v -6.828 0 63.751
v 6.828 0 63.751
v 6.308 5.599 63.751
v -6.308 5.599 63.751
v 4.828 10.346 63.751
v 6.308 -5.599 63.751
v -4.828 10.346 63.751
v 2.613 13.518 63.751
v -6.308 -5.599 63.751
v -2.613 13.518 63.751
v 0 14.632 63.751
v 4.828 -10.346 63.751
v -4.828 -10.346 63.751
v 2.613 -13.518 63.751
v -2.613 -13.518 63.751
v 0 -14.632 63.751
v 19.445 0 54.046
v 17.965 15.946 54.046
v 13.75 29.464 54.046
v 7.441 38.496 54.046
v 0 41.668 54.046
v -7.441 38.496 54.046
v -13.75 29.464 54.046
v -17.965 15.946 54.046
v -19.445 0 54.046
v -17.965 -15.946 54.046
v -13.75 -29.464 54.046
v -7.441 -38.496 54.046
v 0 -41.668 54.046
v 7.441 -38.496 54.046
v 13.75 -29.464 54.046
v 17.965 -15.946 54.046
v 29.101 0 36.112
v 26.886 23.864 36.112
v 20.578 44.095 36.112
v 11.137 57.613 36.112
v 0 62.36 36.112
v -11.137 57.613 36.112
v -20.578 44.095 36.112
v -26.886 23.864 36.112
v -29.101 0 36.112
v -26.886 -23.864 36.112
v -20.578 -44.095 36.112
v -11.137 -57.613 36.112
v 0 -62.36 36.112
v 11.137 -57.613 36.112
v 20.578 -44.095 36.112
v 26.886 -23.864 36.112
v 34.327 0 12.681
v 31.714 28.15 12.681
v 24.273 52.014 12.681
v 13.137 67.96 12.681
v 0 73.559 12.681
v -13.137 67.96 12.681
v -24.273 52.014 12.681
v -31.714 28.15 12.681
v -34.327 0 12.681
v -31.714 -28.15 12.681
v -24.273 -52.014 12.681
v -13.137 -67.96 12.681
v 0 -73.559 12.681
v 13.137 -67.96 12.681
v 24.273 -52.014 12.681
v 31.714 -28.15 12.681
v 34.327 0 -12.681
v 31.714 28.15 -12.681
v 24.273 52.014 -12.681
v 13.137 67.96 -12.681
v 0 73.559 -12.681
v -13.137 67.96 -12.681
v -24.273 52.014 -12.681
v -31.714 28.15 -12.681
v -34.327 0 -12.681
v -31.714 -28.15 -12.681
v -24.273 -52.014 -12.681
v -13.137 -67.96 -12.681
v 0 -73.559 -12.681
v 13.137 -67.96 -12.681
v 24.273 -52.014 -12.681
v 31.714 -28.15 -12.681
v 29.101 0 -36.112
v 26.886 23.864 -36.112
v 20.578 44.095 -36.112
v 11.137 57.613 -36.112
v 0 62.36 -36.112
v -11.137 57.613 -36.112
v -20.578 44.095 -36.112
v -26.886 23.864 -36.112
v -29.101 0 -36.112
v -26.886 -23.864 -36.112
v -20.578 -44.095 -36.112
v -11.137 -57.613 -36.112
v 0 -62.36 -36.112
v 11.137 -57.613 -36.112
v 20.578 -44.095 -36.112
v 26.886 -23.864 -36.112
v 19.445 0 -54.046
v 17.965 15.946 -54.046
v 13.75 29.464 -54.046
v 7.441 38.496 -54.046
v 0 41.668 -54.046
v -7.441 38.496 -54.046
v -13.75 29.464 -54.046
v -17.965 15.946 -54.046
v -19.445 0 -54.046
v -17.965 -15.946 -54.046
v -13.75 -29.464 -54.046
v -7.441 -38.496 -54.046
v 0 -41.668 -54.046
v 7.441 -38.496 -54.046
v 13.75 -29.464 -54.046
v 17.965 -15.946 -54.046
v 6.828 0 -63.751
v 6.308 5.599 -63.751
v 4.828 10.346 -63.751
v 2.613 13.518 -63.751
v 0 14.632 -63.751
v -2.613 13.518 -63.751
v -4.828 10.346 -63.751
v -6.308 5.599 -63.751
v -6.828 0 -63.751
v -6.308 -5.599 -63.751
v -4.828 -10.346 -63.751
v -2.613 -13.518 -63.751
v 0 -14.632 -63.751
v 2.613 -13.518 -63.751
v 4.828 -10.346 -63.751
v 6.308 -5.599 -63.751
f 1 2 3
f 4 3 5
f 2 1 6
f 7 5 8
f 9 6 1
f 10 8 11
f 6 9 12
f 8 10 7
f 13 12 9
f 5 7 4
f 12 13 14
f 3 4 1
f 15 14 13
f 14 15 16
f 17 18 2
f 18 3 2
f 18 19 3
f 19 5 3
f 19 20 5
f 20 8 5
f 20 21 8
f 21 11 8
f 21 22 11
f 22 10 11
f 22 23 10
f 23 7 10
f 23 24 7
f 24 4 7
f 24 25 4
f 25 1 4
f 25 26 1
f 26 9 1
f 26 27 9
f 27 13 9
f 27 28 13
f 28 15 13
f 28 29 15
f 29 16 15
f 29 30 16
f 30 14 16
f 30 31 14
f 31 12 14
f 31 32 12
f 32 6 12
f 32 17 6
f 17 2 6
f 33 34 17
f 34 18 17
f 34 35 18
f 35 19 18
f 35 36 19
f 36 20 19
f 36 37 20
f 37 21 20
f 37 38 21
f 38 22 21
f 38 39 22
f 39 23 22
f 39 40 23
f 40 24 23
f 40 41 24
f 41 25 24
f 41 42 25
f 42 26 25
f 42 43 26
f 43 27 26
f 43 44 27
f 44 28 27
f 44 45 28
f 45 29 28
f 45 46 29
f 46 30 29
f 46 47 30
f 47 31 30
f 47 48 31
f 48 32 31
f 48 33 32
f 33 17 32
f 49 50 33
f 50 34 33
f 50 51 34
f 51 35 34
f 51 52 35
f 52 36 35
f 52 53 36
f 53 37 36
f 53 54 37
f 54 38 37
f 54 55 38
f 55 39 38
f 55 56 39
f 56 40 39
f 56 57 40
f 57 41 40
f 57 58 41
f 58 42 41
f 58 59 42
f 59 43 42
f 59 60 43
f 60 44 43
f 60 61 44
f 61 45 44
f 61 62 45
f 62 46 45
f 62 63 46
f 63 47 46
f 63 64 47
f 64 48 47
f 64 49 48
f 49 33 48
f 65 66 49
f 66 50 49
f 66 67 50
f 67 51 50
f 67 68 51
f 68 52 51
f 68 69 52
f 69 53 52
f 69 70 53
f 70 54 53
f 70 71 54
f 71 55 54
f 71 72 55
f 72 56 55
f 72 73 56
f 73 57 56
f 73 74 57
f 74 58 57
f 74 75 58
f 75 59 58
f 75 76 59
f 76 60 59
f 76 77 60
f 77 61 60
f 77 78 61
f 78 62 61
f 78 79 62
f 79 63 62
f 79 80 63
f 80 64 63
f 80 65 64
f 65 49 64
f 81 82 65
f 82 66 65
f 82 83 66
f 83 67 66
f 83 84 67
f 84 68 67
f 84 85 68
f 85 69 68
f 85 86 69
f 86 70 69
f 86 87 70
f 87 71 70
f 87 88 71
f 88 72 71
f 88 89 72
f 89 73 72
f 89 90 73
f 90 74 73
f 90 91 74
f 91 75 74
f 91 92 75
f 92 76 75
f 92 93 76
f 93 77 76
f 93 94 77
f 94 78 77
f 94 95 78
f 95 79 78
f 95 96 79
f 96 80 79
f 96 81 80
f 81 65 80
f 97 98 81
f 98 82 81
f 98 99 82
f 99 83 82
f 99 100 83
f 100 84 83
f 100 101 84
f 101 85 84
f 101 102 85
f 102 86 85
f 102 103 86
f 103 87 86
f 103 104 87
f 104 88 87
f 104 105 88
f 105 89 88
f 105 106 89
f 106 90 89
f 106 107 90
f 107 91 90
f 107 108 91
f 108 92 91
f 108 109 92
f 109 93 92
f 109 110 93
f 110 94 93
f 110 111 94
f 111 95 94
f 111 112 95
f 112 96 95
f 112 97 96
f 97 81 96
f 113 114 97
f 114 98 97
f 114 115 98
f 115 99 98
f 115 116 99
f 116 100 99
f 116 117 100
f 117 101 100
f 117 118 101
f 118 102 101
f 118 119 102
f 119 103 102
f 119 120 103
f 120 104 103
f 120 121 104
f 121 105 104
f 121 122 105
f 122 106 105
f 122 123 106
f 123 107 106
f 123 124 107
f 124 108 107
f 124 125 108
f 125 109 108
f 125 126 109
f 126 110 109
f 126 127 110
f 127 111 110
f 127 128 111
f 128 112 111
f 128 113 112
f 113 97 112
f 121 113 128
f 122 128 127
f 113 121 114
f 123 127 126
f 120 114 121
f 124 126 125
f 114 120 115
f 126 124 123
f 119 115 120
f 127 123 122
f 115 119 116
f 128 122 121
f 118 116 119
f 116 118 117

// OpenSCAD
// Generated by SolidPython 1.0.1 on 2020-07-29 00:46:48


scale(v = [7, 15, 13]) {
	sphere(r = 5);
}
/***********************************************
*********      SolidPython code:      **********
************************************************
 
# import packages: SolidPython
from solid import *
from solid.utils import *
from itertools import chain, combinations, permutations


class Resize:

    def __init__(self, scad_file):
        self.scad_file = scad_file
        #self.scad_file = import_scad(scad_file)
        # cone/cylinder param:
        self.r1 = 0
        self.r2 = 0
        self.h = 0
        # rectangular prism param:
        self.w = 0
        self.l = 0
        # ellipse param:
        self.r = 0

    # import OpenScad code (file name corresponds to shape)


    # classify shape + parameters
    def assign(self, param1, param2, param3):
        if self.scad_file == 'cone.scad':
            self.r1 = param1
            self.r2 = param2
            self.h = param3
        elif self.scad_file == 'cylinder.scad':
            self.r1 = param1
            self.r2 = param2
            self.h = param3
        elif self.scad_file == 'rectangularPrism.scad':
            self.h = param1
            self.l = param2
            self.w = param3
        else:
            self.r = param1
            self.h = param2

    # resize parameters
    def iterate(self):
        x = range(3, 20, 2)
        i = 1
        if self.scad_file == 'cone.scad':
            tempList = list(permutations(x, 2))
            for temp in tempList:
                param1 = temp[0]
                param2 = temp[1]
                filepath = 'produced_scad_files/' + 'cone' + str(param1) + '_' + str(param2) + '_' + '.scad'
                scad_render_to_file(cylinder(h=param1, r1=param2, r2=0), filepath)

        elif self.scad_file == 'cylinder.scad':
            tempList = list(permutations(x, 3))
            for temp in tempList:
                param1 = temp[0]
                param2 = temp[1]
                filepath = 'produced_scad_files/' + 'cylinder' + str(param1) + '_' + str(param2) + '_' + '.scad'
                scad_render_to_file(cylinder(h=param1, r1=param2, r2=param2), filepath)

        elif self.scad_file == 'rectangularPrism.scad':
            tempList = list(permutations(x, 3))
            for temp in tempList:
                param1 = temp[0]
                param2 = temp[1]
                param3 = temp[2]
                filepath = 'produced_scad_files/' + 'rectangularPrism' + str(param1) + '_' + str(param2) + '_' + str(
                    param3) + '.scad'
                scad_render_to_file(cube(size=(param1, param2, param3)), filepath)

        elif self.scad_file == 'ellipse.scad':
            tempList = list(permutations(x, 4))
            for temp in tempList:
                param1 = temp[0]
                param2 = temp[1]
                param3 = temp[2]
                param4 = temp[3]
                filepath = 'produced_scad_files/' + 'ellipse' + str(param1) + '_' + str(param2) + '_' + str(param3) + '_' + str(param4) + '.scad'
                scad_render_to_file(scale([param1, param2, param3])(sphere(r=param4)), filepath)

    def render_to_scadfile(self):
        scad_render_to_file(scad, 'example.scad') 
 
************************************************/
